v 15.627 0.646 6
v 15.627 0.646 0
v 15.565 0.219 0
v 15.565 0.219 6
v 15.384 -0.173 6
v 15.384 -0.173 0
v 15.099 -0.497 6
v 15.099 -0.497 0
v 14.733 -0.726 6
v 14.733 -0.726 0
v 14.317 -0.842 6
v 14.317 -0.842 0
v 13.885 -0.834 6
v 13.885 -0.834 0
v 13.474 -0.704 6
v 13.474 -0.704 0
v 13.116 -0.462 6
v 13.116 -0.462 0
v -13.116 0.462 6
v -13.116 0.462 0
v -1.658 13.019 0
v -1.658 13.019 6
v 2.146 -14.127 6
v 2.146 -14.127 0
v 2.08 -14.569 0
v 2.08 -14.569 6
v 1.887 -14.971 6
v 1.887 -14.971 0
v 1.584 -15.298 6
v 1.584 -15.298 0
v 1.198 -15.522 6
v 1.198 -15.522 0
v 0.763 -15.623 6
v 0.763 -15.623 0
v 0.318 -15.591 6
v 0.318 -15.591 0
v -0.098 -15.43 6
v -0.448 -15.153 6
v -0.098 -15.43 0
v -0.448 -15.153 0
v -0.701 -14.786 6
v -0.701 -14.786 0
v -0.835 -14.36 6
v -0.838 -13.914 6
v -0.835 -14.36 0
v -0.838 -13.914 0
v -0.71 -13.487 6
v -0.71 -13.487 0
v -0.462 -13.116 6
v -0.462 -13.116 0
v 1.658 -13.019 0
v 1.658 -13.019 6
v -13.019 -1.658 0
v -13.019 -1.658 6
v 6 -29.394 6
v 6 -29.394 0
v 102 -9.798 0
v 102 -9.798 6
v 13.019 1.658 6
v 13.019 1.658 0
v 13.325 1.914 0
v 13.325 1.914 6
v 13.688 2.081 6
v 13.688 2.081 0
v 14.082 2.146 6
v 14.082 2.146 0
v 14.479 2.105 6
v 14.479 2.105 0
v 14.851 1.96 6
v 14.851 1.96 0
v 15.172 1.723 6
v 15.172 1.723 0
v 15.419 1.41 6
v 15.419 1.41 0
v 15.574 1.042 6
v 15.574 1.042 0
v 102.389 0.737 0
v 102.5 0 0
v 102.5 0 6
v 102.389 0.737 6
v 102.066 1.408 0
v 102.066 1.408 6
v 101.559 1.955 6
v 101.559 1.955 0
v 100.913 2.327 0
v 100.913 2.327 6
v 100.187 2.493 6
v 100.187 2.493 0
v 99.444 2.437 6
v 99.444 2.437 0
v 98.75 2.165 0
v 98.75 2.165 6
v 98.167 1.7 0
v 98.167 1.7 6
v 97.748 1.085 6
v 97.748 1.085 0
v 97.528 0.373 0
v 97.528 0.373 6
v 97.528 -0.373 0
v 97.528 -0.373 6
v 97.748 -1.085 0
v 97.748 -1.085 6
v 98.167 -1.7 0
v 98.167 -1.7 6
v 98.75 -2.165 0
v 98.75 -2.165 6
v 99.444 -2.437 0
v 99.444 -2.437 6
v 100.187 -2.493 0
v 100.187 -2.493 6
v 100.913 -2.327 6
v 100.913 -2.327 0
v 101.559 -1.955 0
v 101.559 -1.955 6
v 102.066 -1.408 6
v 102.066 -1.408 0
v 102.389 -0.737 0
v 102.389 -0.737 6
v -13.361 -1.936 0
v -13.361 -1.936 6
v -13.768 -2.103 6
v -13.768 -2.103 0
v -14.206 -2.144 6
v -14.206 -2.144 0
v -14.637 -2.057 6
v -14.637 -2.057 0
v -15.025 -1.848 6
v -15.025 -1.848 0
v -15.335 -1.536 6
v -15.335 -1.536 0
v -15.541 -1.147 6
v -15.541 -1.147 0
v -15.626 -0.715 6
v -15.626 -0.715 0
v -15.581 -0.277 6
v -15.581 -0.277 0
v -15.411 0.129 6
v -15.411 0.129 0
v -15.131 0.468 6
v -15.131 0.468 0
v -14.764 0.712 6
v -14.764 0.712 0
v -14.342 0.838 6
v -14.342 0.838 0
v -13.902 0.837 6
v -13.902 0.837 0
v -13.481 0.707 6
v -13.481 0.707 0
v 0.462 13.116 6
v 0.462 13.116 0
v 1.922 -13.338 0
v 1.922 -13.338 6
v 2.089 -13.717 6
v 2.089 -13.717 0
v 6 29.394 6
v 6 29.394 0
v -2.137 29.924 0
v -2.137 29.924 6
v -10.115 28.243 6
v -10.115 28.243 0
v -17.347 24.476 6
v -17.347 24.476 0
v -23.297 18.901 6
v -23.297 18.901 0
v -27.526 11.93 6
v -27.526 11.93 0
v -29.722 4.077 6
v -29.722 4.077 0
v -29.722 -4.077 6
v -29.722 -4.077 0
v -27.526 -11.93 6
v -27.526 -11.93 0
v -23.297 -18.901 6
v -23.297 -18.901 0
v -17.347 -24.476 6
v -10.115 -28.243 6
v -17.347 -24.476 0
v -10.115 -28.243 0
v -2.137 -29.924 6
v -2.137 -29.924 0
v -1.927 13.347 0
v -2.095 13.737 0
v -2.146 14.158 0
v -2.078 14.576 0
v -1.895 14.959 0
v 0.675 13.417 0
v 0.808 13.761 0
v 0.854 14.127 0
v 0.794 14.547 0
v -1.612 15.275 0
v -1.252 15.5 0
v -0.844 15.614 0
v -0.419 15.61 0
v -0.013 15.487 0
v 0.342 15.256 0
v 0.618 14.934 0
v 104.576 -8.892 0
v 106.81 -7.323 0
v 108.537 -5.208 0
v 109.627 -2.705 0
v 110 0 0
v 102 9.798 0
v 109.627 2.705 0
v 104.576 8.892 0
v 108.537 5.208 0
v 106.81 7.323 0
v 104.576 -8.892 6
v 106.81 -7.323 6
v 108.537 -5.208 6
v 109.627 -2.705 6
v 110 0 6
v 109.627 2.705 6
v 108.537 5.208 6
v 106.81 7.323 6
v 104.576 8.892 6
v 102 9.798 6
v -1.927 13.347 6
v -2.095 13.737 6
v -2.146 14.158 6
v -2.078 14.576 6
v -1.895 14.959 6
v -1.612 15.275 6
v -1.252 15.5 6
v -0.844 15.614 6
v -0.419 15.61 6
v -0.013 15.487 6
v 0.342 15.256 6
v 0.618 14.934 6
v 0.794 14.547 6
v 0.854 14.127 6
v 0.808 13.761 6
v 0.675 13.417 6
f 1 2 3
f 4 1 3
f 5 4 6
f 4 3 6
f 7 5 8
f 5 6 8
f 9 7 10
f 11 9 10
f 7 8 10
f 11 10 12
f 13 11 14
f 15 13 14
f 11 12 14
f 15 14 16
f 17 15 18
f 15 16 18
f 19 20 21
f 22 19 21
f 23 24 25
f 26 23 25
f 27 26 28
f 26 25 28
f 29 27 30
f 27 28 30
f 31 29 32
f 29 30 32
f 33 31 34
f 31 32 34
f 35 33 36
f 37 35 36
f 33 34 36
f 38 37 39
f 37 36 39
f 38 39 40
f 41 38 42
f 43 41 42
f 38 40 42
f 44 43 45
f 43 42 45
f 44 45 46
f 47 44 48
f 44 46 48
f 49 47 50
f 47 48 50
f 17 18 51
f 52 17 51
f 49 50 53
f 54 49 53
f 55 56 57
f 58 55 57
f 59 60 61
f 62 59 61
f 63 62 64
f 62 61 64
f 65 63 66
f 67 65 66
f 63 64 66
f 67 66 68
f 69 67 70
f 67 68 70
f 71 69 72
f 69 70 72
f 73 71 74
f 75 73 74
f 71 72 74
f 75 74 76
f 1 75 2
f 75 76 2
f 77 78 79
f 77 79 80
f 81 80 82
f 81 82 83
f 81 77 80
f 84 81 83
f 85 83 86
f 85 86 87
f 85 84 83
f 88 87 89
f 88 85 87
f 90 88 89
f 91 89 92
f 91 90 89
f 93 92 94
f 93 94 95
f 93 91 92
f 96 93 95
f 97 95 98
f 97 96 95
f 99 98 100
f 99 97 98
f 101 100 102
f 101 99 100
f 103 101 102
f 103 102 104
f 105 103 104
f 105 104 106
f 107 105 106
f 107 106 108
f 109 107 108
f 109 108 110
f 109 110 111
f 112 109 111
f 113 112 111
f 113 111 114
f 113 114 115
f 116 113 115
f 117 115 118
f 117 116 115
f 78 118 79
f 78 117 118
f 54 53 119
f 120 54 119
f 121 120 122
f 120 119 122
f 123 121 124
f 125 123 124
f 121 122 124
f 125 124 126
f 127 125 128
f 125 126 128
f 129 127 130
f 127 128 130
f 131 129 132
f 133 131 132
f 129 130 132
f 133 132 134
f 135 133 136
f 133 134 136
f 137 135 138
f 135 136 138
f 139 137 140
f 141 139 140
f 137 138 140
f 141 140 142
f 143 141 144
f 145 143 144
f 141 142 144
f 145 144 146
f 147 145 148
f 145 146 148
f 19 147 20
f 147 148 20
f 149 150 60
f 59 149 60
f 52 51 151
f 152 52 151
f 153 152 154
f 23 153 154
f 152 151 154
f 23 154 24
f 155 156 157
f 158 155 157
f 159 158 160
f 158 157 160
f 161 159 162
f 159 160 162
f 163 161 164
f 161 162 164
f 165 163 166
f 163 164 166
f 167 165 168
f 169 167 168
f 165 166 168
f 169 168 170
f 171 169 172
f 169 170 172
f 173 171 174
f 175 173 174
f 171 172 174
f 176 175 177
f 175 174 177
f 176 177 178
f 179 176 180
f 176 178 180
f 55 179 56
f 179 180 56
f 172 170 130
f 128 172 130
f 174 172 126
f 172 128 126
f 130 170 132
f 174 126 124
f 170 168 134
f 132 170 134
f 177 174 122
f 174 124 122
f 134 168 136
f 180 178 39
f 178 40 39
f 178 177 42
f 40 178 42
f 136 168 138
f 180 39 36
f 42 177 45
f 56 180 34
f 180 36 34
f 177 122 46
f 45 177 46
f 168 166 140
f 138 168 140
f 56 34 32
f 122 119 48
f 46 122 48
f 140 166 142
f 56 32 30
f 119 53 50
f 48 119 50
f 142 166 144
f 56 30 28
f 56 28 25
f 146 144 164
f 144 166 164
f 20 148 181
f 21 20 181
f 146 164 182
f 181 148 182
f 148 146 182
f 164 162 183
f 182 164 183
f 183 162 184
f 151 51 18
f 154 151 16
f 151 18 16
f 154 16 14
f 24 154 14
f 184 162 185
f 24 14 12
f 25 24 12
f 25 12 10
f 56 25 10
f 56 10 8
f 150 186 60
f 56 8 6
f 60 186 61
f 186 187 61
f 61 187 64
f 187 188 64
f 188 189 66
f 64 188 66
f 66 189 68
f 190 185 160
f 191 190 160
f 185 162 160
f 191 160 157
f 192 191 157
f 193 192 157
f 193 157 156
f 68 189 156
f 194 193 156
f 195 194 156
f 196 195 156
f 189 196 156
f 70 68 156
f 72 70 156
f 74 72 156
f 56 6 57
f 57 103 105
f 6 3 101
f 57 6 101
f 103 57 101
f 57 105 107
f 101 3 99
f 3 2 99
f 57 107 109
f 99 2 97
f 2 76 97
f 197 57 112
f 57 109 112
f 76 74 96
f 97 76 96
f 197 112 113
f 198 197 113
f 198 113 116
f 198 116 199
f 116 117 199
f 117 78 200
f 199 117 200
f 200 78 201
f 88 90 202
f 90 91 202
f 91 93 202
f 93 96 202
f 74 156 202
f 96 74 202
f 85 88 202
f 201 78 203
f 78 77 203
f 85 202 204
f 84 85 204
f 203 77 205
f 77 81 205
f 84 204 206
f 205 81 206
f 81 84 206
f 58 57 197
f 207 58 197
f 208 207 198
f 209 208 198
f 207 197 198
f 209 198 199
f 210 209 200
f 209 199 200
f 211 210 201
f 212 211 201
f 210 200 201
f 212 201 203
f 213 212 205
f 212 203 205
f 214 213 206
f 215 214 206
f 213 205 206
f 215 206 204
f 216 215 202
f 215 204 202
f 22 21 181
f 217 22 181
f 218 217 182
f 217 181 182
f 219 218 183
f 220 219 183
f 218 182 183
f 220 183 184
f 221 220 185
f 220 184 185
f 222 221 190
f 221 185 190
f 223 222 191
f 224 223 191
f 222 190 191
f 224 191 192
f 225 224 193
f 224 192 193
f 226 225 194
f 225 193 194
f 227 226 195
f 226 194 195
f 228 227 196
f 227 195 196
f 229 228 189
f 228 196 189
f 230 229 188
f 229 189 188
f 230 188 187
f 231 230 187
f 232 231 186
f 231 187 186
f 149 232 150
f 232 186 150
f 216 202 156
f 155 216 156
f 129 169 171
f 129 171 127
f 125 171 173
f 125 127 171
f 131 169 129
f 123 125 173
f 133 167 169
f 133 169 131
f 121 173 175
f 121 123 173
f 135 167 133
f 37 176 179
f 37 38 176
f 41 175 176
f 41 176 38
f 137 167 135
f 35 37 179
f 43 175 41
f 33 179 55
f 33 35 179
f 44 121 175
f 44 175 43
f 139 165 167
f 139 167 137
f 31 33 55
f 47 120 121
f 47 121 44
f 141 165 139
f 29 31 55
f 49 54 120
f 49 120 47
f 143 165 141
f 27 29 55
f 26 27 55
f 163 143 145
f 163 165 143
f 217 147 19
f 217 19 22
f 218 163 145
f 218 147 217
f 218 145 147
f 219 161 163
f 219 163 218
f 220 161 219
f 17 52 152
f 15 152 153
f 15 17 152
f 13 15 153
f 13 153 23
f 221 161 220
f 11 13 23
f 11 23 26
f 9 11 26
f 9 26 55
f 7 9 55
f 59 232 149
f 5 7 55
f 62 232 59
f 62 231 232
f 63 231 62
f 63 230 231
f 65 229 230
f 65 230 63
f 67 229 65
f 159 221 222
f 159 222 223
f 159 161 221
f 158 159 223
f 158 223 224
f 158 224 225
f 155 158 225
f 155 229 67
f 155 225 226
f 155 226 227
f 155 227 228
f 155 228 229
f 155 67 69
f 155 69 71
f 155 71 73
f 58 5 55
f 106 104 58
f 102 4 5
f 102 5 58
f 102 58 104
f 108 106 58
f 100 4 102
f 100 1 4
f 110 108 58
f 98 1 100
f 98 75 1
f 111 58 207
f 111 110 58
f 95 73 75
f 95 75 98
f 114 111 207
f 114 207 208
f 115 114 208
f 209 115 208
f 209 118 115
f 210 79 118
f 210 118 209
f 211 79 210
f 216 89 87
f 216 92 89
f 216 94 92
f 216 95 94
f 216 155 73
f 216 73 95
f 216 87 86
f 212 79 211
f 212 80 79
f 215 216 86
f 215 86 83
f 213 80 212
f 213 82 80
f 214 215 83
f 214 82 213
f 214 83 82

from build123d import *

# Parameters (mm, degrees)
SKETCH_1_R      = 2.5
EXTRUDE_1_DEPTH = 6


with BuildPart() as part:
    # 草图1 → 凸台-拉伸1 (new body)
    with BuildSketch(Plane.XY):
        with BuildLine():
            ThreePointArc((6, 29.393876913), (-30, 0), (6, -29.393876913))
            Line((6, -29.393876913), (102, -9.797958971))
            ThreePointArc((102, -9.797958971), (110, 0), (102, 9.797958971))
            Line((102, 9.797958971), (6, 29.393876913))
        make_face()
        with BuildLine():
            ThreePointArc((-13.019316478, -1.657527811), (-15.625784497, -0.715028484), (-13.11628562, 0.461575061))
            Line((-13.11628562, 0.461575061), (-1.657527811, 13.019316478))
            ThreePointArc((-1.657527811, 13.019316478), (-1.252018417, 15.499686318), (0.853539054, 14.127352485))
            ThreePointArc((0.853539054, 14.127352485), (0.752119408, 13.58515972), (0.461575061, 13.11628562))
            Line((0.461575061, 13.11628562), (13.019316478, 1.657527811))
            ThreePointArc((13.019316478, 1.657527811), (14.66954525, 2.0450413), (15.627352485, 0.646460946))
            ThreePointArc((15.627352485, 0.646460946), (14.732909957, -0.725872887), (13.11628562, -0.461575061))
            Line((13.11628562, -0.461575061), (1.657527811, -13.019316478))
            ThreePointArc((1.657527811, -13.019316478), (2.018794779, -13.521795014), (2.146460946, -14.127352485))
            ThreePointArc((2.146460946, -14.127352485), (0.104268181, -15.525932839), (-0.461575061, -13.11628562))
            Line((-0.461575061, -13.11628562), (-13.019316478, -1.657527811))
        make_face(mode=Mode.SUBTRACT)
        with Locations((100, 0)):
            Circle(SKETCH_1_R, mode=Mode.SUBTRACT)
    extrude(amount=EXTRUDE_1_DEPTH)


solid = part.part
